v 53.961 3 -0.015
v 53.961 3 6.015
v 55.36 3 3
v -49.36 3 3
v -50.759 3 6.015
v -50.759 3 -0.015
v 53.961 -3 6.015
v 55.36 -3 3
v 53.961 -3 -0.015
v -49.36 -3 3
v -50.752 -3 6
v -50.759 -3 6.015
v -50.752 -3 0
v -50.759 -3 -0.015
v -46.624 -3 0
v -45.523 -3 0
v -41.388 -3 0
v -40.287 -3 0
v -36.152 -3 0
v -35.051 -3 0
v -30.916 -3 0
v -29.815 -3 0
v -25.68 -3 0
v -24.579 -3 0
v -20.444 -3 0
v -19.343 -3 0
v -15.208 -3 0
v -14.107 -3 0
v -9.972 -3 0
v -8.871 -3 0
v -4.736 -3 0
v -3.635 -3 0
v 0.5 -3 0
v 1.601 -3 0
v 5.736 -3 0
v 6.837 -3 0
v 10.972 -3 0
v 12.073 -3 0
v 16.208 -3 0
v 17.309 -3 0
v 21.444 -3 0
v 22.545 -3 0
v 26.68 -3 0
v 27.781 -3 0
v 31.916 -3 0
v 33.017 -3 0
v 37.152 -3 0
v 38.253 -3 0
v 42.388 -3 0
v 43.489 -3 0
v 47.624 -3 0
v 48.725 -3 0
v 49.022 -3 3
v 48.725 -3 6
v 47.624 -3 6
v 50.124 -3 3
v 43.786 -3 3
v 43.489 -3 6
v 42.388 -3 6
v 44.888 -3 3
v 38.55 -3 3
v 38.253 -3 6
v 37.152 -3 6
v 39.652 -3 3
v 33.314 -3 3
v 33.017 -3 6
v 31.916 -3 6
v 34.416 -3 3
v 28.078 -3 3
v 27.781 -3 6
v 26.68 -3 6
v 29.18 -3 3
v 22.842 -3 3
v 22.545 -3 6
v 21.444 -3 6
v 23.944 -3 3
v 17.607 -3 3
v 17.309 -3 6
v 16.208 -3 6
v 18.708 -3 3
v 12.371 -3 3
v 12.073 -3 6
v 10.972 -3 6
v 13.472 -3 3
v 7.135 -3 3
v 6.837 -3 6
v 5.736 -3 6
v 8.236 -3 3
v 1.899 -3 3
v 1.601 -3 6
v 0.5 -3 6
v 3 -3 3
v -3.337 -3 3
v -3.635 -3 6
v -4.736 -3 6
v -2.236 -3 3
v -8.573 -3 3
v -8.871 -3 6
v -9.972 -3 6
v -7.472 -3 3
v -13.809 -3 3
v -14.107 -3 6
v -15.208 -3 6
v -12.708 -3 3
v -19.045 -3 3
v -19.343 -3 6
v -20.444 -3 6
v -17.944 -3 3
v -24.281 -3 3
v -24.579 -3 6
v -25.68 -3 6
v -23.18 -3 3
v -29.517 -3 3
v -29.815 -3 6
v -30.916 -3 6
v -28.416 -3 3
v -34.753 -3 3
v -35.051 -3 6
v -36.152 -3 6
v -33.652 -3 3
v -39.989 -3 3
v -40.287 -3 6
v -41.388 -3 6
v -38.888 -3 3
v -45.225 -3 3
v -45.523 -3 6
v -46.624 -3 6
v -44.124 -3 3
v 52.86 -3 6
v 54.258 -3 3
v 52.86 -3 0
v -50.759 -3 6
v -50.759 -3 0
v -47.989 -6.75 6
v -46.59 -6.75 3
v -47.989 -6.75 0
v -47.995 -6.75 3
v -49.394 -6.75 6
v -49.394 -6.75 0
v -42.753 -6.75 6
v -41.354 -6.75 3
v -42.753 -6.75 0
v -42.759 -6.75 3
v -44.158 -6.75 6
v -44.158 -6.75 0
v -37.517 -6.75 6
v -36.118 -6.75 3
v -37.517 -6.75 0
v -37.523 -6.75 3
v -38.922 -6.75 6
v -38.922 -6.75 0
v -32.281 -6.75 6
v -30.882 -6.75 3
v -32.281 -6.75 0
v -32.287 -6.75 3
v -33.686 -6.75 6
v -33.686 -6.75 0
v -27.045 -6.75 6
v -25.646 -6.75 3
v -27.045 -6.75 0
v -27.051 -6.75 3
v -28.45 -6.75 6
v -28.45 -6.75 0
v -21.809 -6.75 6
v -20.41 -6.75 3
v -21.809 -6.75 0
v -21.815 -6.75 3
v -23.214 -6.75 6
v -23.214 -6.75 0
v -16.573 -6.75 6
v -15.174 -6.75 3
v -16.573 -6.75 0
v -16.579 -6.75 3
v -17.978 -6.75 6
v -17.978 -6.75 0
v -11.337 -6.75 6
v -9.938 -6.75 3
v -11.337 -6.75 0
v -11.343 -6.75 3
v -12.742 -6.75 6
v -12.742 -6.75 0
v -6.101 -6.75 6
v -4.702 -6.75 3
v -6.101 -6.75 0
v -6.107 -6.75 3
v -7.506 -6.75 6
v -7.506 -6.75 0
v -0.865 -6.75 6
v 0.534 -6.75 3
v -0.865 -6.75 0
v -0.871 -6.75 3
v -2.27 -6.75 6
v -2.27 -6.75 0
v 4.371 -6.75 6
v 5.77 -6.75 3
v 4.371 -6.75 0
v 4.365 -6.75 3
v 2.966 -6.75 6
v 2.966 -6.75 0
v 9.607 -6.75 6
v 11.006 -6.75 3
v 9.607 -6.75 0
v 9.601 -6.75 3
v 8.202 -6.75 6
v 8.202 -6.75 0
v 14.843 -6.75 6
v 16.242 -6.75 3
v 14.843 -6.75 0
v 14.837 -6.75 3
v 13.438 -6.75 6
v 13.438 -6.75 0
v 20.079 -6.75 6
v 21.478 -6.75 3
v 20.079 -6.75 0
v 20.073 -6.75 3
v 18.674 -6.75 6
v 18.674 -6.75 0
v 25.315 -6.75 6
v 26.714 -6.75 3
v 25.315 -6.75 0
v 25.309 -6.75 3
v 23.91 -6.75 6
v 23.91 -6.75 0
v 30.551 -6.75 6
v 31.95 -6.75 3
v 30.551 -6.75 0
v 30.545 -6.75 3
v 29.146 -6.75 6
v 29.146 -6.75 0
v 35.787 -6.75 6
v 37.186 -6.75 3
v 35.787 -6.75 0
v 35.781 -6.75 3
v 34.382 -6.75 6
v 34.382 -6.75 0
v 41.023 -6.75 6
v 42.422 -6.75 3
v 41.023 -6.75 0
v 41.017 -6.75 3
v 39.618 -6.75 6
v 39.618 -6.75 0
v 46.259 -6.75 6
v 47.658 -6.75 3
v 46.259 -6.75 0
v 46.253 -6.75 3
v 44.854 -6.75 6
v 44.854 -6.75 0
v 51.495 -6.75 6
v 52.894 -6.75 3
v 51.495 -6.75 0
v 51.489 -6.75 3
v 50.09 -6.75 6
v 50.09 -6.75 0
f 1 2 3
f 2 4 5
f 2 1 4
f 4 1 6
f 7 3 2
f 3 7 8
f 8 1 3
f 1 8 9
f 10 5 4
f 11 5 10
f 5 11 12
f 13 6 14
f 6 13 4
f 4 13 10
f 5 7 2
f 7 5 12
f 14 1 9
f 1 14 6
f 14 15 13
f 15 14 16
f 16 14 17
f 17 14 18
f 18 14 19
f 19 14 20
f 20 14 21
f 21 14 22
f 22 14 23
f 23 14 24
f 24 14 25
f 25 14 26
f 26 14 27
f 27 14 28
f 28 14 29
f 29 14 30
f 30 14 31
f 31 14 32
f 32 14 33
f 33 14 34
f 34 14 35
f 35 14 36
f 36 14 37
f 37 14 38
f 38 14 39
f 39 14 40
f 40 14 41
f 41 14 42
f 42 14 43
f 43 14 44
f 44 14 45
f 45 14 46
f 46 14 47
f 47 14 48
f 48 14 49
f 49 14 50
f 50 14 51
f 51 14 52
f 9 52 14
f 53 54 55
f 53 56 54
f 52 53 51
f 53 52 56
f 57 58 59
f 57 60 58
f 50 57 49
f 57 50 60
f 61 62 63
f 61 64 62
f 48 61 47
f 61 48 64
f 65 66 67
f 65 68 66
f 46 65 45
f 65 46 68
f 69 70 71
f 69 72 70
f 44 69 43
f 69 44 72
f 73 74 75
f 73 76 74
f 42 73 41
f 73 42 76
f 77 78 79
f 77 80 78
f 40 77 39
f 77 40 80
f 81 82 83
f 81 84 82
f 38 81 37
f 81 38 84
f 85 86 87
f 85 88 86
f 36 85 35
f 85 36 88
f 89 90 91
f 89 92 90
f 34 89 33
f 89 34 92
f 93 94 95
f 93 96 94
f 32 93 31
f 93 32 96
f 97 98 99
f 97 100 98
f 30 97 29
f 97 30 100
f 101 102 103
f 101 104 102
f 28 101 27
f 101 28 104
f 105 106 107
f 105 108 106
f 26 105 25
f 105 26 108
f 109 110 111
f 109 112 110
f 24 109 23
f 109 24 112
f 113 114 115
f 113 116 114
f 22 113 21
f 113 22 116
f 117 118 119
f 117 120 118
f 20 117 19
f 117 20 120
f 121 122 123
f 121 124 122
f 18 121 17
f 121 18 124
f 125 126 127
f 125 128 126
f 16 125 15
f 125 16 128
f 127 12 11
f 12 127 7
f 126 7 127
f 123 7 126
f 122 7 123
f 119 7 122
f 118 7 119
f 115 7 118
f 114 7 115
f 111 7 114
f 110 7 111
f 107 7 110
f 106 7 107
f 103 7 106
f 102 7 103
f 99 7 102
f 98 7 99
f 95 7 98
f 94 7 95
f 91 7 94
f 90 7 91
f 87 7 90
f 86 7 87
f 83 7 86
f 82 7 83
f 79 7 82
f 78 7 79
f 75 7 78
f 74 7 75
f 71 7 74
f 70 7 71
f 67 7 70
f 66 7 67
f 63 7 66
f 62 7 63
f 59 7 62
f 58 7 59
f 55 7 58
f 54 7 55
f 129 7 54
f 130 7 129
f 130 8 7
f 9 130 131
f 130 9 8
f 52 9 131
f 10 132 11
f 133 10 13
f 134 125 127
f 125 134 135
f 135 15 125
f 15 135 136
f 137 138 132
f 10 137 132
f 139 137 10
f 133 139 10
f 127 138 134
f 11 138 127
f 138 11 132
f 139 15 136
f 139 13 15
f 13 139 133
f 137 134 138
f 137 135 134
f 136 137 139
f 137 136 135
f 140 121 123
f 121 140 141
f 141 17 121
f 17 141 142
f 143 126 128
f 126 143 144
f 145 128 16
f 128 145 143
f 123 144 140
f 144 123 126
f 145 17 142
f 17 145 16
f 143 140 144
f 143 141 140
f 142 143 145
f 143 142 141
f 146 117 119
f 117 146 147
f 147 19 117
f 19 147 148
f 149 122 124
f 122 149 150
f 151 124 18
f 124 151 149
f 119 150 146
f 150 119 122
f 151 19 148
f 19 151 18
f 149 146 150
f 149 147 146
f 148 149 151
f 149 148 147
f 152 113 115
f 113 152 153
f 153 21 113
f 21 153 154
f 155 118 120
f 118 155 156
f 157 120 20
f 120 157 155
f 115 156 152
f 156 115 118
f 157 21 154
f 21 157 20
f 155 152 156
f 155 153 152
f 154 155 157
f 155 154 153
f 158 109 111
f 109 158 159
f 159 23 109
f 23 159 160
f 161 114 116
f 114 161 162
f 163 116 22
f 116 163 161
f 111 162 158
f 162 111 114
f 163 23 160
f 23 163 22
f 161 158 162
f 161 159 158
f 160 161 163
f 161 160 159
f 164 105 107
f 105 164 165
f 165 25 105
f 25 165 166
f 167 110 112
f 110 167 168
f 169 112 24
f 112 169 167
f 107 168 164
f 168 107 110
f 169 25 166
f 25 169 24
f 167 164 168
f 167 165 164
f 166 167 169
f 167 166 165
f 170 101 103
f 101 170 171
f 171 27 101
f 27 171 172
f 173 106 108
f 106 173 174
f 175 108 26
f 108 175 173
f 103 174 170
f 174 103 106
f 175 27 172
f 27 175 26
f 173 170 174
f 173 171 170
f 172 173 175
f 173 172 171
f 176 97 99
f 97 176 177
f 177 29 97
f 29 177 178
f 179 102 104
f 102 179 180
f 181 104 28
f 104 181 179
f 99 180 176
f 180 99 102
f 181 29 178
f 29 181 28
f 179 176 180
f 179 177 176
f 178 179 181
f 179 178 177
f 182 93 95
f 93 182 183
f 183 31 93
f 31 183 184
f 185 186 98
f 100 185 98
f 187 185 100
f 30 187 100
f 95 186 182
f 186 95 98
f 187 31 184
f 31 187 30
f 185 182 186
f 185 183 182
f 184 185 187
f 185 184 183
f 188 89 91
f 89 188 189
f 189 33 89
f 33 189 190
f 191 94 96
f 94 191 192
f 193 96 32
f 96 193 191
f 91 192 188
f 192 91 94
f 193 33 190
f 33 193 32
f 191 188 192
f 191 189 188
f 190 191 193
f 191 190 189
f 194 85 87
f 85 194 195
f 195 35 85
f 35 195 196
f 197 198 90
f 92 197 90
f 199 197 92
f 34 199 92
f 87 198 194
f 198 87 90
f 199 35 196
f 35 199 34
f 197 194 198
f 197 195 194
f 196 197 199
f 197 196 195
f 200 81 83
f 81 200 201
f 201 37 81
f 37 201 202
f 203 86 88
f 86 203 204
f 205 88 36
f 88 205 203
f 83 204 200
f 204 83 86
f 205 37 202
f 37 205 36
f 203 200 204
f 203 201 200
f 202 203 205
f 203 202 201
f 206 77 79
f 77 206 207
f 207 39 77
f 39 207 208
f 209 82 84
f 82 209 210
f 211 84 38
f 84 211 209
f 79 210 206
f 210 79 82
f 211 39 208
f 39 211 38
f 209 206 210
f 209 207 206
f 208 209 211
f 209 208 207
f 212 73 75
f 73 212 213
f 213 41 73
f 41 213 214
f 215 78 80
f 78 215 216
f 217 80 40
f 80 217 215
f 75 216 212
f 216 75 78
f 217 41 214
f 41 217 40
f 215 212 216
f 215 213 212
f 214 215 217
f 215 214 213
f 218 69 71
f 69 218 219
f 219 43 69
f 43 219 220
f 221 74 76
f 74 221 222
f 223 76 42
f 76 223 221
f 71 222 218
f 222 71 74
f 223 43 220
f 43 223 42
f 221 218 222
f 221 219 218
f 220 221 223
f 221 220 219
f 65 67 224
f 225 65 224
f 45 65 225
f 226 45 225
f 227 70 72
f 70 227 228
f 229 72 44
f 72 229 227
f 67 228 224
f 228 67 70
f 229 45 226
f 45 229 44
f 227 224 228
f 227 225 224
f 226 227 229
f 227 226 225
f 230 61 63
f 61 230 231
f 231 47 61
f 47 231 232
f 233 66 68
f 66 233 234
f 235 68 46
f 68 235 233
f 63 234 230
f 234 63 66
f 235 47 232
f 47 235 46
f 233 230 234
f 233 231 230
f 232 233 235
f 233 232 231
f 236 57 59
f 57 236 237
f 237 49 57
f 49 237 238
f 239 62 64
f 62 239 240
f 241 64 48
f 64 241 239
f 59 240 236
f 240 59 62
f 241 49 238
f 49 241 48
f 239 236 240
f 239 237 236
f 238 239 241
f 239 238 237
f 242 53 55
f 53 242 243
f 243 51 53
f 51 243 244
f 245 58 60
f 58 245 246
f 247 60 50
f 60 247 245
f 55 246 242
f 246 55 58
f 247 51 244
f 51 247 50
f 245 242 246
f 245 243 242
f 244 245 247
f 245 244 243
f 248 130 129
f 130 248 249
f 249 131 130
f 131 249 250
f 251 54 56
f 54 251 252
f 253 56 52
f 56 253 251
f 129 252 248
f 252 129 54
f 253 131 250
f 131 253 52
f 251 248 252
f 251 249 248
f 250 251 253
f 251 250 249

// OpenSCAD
// Parametric Modular Rack Mark "Ckaos" Moissette
//Based on the work of MattMoses and Fdavies :
//http://forums.reprap.org/read.php?1,51452,52099#msg-52099
//and Forrest Higgs:
// http://technocraticanarchist.blogspot.com/2010/01/high-speed-alternative-to-belts.html
//It is licensed under the Creative Commons - GNU GPL license.
// © 2011 by Mark "Ckaos" Moissette
//more info at :www.kaosat.net and
//http://www.thingiverse.com/thing:6011



pi=3.1415926535897932384626433832795;
innerRadius=0;//shaft radius, in mm
borders=3;//how thick should the borders around the central "shaft" be, in mm
diametralPitch=12;
numberOfTeeth=20;
pressureAngle=20*pi/180;
centerAngle=25;//angle at center of teeth


//example usage
rack(innerRadius,borders,diametralPitch,numberOfTeeth,pressureAngle,centerAngle);



module rack(innerRadius,borders,P,N,PA,CA)
{
	// P = diametral pitch
	// N = number of teeth
	// PA = pressure angle in radians
	// x, y = linear offset distances
	a = 1/P; // addendum (also known as "module")
	d = 1.25/P; // dedendum (this is set by a standard)
	multiplier=20;//20
	height=(d+a)*multiplier;
	
	
	// find the tangent of pressure angle once
	tanPA = tan(PA*(180/pi));
	// length of bottom and top horizontal segments of tooth profile
	botL = (pi/P/2 - 2*d*tanPA)*multiplier;
	topL =( pi/P/2 - 2*a*tanPA)*multiplier;

	slantLng=tanPA*height;
	realBase=2*slantLng+topL;
	
	
	offset=topL+botL+2*slantLng;
	length=(realBase+botL)*N;

	supportSize=(innerRadius+borders)*2;

	//calculate tooth params
	basesegmentL=realBase/2;
	basesegmentW=supportSize/2;

	topsegmentL=topL/2;
	topsegmentW=supportSize/2;

	baseoffsetY=tan(CA)*basesegmentW;
	topoffsetY=tan(CA)*topsegmentW;
	
	//calculate support params

	totalSupportLength=(N)*(offset);
	supportL=totalSupportLength/2;
	supportW=supportSize/1.99;
	
	echo("Total length",totalSupportLength+baseoffsetY);
	echo("Total height",supportSize);

	
	rotate([90,90,0])
	{
	translate([-supportSize/2,supportSize/2,0])
	{
	union()
	{
		difference()
		{
			support(supportL,supportW,supportSize,baseoffsetY);
			rotate([90,90,0]) 
			{cylinder(h=length+10,r=innerRadius,center=true,$fn=100);}
		}

	
		for (i = [0:N-1]) 
		{
			translate([0,i*offset-length/2+realBase/2,supportSize/2+height/2]) 
			{	
				
				tooth(basesegmentL,basesegmentW,topsegmentL,topsegmentW,height,baseoffsetY,topoffsetY);
				
			}
		}
	}
	
	}
	}
}

module support(supportL,supportW,height,offsetY)
{
	 tooth(supportL,supportW,supportL,supportW,height,offsetY,offsetY);
}



module tooth(basesegmentL,basesegmentW,topsegmentL,topsegmentW,height,baseoffsetY,topoffsetY)//top : width*length, same for base
{
	
	////////////////
	basePT1=[
	-basesegmentW,
	basesegmentL-baseoffsetY,
	-height/2];

	basePT2=[
	0,
	basesegmentL,
	-height/2];

	basePT3=[
	basesegmentW,
	basesegmentL-baseoffsetY,
	-height/2];

	basePT4=[
	basesegmentW,
	basesegmentL-(baseoffsetY+basesegmentL*2),
	-height/2];
	
	basePT5=[
	0,
	-basesegmentL,
	-height/2];

	basePT6=[
	-basesegmentW,
	basesegmentL-(baseoffsetY+basesegmentL*2),
	-height/2];
	//////////////////////////
	topPT1=[
	-topsegmentW,
	topsegmentL-topoffsetY,
	height/2];

	topPT2=[
	0,
	topsegmentL,
	height/2];

	topPT3=[
	topsegmentW,
	topsegmentL-topoffsetY,
	height/2];

	topPT4=[
	topsegmentW,
	topsegmentL-(topoffsetY+topsegmentL*2),
	height/2];
	
	topPT5=[
	0,
	-topsegmentL,
	height/2];

	topPT6=[
	-topsegmentW,
	topsegmentL-(topoffsetY+topsegmentL*2),
	height/2];
	//////////////////////////

	//////////////////////////

	polyhedron(
	points=[
		basePT1,
		basePT2,
		basePT3,
		basePT4,
		basePT5,
		basePT6,
		topPT1,
		topPT2,
		topPT3,
		topPT4,
		topPT5,
		topPT6],
	triangles=[
	//base
	[5,1,0],
	[4,1,5],
	[4,2,1],
	[3,2,4],	

	//front
	[1,6,0],
	[7,6,1],
	[2,7,1],
	[8,7,2],
	//back
	[11,10,5],
	[5,10,4],
	[10,9,4],
	[4,9,3],	
	//side 1
	[0,11,5],
	[6,11,0],
	//side 2
	[3,8,2],
	[9,8,3],
	//top
	[9,10,8],
	[10,7,8],
	[11,7,10],
	[6,7,11],
	]
	);
}

module demo_gear(position,diametralPitch)
{
	wheelSize=12;
rotate([0,90,180])
translate(position)

{
gear (
	number_of_teeth=8,
	circular_pitch=300, 
	pressure_angle=19.34,
	gear_thickness=wheelSize/2,
	rim_thickness=wheelSize/2,
	hub_thickness=0,
	bore_diameter=2,
	backlash=0,twist=centerAngle,involute_facets=15);

translate([0,0,wheelSize/2])
rotate([0,0,-centerAngle])
gear (
	number_of_teeth=8,
	circular_pitch=300, 
	pressure_angle=19.34,
	gear_thickness=wheelSize/2,
	rim_thickness=wheelSize/2,
	hub_thickness=0,
	bore_diameter=2,
	backlash=0,twist=-centerAngle,involute_facets=15);

}

}
